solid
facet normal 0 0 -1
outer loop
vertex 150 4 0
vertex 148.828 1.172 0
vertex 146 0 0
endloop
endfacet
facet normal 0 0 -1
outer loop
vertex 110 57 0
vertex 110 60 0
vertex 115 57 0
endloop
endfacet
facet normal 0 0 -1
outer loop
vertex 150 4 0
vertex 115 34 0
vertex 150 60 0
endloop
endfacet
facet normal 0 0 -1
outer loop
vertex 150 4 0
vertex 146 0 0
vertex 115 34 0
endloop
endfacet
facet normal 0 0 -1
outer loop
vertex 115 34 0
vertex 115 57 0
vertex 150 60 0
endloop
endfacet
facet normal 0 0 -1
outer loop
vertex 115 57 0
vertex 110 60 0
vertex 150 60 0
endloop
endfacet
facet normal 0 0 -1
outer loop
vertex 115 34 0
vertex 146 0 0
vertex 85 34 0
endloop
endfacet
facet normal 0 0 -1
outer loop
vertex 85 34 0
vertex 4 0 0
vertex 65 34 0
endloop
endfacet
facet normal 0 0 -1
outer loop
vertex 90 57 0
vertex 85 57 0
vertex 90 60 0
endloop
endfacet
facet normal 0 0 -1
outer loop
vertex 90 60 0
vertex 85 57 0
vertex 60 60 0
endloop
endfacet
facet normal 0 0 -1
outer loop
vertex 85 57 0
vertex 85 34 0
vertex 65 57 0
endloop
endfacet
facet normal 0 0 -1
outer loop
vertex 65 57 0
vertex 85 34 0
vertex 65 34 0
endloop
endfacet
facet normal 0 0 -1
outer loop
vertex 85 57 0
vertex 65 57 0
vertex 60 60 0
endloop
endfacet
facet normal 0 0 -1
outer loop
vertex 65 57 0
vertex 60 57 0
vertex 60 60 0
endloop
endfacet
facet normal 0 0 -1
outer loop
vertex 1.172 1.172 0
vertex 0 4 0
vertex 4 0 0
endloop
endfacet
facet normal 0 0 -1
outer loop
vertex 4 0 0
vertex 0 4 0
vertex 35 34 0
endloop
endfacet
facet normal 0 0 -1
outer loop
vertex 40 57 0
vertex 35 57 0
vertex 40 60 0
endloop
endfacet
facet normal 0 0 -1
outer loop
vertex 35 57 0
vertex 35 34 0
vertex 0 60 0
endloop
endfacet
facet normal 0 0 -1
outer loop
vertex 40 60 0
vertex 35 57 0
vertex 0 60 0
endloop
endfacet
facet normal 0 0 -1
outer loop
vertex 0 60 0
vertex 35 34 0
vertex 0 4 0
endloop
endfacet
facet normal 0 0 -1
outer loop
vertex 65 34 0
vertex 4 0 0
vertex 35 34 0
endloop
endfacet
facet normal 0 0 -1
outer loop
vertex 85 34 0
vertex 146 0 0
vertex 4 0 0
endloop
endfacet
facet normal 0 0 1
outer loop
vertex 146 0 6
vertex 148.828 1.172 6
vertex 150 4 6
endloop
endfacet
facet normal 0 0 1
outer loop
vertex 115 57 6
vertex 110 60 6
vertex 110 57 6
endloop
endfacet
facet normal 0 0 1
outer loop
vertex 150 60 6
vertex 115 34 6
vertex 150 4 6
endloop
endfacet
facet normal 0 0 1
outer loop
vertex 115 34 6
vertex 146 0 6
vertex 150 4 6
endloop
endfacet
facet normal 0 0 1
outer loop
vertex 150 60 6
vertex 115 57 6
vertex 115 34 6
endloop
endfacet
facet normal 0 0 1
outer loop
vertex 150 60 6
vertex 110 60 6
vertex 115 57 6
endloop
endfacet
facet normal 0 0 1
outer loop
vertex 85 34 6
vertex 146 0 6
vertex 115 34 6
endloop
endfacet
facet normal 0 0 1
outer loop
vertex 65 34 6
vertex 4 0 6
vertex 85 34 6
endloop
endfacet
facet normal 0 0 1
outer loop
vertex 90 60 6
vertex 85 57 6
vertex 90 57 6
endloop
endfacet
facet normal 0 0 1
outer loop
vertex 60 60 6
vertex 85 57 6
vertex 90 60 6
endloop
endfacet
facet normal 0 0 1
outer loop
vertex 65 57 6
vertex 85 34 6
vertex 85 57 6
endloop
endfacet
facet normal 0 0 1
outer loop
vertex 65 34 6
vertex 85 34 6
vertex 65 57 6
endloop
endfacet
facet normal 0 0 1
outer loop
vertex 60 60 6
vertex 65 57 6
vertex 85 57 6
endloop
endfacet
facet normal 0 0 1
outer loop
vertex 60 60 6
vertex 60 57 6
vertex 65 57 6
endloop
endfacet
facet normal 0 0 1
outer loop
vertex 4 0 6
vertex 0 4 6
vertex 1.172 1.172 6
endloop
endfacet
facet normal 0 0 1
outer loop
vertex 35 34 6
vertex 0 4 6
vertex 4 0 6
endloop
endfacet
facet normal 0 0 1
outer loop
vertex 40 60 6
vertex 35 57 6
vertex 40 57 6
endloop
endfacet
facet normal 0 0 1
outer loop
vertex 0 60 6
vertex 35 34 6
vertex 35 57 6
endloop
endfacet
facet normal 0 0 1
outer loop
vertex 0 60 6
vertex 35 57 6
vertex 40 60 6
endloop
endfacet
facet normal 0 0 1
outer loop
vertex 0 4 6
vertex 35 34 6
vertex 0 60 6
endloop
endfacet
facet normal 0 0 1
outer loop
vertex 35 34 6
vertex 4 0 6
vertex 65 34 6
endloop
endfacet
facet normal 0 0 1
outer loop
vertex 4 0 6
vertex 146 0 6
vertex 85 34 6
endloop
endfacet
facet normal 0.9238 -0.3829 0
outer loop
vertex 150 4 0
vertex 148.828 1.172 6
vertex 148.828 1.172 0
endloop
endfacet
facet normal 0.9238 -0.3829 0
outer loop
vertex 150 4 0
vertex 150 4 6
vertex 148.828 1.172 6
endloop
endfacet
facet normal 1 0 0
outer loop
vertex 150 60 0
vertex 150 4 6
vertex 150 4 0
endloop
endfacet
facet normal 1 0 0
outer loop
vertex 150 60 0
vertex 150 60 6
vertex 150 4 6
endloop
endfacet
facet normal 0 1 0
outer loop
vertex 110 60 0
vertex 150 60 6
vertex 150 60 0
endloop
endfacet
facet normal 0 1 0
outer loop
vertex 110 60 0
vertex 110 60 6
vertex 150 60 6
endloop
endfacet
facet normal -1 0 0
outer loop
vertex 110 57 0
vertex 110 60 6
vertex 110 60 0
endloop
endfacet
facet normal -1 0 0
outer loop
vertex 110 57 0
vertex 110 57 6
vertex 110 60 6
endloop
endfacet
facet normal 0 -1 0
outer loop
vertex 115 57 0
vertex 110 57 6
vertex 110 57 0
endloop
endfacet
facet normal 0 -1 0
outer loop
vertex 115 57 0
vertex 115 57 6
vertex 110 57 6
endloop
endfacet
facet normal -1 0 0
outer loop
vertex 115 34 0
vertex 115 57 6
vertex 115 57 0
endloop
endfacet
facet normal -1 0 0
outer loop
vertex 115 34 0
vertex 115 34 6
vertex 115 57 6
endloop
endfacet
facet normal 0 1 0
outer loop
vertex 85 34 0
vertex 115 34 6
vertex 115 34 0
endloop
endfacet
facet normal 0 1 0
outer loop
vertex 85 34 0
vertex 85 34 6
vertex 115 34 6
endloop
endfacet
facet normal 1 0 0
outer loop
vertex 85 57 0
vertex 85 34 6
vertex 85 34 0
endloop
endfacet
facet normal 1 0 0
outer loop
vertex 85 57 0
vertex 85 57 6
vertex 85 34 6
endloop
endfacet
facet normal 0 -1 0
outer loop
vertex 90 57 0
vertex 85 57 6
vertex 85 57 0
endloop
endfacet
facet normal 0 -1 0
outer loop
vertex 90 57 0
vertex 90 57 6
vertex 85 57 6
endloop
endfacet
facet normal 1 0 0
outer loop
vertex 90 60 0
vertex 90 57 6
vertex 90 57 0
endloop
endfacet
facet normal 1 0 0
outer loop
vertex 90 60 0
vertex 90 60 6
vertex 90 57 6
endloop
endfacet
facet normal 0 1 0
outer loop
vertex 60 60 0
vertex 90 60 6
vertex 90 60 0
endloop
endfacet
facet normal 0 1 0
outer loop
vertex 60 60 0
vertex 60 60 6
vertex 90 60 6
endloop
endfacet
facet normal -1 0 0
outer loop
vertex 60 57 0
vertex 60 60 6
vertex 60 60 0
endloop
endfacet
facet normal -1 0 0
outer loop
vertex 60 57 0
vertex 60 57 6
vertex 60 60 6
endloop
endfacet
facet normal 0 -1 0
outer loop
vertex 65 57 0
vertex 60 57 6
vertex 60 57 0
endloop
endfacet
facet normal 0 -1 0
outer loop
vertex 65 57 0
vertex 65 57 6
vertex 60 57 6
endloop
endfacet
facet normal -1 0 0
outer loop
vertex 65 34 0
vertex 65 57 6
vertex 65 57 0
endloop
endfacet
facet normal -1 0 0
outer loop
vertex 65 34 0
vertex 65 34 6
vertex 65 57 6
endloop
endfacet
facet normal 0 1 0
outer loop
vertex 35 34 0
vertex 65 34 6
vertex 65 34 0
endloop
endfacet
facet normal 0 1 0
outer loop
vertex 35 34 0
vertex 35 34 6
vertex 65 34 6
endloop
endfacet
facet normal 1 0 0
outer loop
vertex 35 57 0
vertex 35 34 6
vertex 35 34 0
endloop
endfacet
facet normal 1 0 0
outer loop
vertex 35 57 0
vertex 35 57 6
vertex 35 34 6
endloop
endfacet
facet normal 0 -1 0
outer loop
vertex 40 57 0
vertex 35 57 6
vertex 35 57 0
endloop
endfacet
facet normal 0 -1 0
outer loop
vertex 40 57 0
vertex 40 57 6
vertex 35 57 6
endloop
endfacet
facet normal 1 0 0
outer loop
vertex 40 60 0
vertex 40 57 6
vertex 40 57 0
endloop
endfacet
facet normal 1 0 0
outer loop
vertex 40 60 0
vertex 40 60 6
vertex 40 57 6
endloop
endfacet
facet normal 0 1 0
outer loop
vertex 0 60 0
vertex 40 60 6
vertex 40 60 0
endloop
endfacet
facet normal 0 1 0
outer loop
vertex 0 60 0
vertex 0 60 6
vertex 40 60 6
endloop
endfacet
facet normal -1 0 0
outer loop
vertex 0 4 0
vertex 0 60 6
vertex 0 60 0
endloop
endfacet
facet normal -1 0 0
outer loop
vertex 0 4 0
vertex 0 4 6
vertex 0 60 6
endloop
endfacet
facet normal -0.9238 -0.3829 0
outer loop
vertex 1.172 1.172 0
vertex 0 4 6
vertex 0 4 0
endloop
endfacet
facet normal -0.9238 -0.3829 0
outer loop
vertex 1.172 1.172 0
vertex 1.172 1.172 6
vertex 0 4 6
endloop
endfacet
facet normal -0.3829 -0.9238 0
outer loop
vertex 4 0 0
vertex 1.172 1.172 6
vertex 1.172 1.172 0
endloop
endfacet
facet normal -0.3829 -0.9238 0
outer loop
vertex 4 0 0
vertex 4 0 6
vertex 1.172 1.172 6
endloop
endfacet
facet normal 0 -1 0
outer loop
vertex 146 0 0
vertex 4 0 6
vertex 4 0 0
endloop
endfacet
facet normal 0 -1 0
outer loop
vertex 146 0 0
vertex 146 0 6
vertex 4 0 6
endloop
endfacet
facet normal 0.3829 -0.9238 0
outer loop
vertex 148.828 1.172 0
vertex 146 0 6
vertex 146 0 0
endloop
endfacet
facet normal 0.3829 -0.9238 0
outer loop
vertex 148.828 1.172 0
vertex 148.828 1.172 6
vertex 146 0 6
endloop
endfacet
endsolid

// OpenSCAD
$fn = 32;

// ----------------------------------------------------------------------
// Oversize slot bar: 150 mm bar with 2 oversize windows
// ----------------------------------------------------------------------

// --- parameters (mm) ---
profile_height = 6;       // extrusion height
profile_points = 24;      // points of the closed outline

profile = [[0, 4], [1.172, 1.172], [4, 0], [146, 0], [148.828, 1.172], [150, 4], [150, 60], [110, 60], [110, 57], [115, 57], [115, 34], [85, 34], [85, 57], [90, 57], [90, 60], [60, 60], [60, 57], [65, 57], [65, 34], [35, 34], [35, 57], [40, 57], [40, 60], [0, 60]];  // single closed polygon, 24 points, counter clockwise

// --- the one profile operation ---
linear_extrude(height = profile_height) polygon(points = profile);
